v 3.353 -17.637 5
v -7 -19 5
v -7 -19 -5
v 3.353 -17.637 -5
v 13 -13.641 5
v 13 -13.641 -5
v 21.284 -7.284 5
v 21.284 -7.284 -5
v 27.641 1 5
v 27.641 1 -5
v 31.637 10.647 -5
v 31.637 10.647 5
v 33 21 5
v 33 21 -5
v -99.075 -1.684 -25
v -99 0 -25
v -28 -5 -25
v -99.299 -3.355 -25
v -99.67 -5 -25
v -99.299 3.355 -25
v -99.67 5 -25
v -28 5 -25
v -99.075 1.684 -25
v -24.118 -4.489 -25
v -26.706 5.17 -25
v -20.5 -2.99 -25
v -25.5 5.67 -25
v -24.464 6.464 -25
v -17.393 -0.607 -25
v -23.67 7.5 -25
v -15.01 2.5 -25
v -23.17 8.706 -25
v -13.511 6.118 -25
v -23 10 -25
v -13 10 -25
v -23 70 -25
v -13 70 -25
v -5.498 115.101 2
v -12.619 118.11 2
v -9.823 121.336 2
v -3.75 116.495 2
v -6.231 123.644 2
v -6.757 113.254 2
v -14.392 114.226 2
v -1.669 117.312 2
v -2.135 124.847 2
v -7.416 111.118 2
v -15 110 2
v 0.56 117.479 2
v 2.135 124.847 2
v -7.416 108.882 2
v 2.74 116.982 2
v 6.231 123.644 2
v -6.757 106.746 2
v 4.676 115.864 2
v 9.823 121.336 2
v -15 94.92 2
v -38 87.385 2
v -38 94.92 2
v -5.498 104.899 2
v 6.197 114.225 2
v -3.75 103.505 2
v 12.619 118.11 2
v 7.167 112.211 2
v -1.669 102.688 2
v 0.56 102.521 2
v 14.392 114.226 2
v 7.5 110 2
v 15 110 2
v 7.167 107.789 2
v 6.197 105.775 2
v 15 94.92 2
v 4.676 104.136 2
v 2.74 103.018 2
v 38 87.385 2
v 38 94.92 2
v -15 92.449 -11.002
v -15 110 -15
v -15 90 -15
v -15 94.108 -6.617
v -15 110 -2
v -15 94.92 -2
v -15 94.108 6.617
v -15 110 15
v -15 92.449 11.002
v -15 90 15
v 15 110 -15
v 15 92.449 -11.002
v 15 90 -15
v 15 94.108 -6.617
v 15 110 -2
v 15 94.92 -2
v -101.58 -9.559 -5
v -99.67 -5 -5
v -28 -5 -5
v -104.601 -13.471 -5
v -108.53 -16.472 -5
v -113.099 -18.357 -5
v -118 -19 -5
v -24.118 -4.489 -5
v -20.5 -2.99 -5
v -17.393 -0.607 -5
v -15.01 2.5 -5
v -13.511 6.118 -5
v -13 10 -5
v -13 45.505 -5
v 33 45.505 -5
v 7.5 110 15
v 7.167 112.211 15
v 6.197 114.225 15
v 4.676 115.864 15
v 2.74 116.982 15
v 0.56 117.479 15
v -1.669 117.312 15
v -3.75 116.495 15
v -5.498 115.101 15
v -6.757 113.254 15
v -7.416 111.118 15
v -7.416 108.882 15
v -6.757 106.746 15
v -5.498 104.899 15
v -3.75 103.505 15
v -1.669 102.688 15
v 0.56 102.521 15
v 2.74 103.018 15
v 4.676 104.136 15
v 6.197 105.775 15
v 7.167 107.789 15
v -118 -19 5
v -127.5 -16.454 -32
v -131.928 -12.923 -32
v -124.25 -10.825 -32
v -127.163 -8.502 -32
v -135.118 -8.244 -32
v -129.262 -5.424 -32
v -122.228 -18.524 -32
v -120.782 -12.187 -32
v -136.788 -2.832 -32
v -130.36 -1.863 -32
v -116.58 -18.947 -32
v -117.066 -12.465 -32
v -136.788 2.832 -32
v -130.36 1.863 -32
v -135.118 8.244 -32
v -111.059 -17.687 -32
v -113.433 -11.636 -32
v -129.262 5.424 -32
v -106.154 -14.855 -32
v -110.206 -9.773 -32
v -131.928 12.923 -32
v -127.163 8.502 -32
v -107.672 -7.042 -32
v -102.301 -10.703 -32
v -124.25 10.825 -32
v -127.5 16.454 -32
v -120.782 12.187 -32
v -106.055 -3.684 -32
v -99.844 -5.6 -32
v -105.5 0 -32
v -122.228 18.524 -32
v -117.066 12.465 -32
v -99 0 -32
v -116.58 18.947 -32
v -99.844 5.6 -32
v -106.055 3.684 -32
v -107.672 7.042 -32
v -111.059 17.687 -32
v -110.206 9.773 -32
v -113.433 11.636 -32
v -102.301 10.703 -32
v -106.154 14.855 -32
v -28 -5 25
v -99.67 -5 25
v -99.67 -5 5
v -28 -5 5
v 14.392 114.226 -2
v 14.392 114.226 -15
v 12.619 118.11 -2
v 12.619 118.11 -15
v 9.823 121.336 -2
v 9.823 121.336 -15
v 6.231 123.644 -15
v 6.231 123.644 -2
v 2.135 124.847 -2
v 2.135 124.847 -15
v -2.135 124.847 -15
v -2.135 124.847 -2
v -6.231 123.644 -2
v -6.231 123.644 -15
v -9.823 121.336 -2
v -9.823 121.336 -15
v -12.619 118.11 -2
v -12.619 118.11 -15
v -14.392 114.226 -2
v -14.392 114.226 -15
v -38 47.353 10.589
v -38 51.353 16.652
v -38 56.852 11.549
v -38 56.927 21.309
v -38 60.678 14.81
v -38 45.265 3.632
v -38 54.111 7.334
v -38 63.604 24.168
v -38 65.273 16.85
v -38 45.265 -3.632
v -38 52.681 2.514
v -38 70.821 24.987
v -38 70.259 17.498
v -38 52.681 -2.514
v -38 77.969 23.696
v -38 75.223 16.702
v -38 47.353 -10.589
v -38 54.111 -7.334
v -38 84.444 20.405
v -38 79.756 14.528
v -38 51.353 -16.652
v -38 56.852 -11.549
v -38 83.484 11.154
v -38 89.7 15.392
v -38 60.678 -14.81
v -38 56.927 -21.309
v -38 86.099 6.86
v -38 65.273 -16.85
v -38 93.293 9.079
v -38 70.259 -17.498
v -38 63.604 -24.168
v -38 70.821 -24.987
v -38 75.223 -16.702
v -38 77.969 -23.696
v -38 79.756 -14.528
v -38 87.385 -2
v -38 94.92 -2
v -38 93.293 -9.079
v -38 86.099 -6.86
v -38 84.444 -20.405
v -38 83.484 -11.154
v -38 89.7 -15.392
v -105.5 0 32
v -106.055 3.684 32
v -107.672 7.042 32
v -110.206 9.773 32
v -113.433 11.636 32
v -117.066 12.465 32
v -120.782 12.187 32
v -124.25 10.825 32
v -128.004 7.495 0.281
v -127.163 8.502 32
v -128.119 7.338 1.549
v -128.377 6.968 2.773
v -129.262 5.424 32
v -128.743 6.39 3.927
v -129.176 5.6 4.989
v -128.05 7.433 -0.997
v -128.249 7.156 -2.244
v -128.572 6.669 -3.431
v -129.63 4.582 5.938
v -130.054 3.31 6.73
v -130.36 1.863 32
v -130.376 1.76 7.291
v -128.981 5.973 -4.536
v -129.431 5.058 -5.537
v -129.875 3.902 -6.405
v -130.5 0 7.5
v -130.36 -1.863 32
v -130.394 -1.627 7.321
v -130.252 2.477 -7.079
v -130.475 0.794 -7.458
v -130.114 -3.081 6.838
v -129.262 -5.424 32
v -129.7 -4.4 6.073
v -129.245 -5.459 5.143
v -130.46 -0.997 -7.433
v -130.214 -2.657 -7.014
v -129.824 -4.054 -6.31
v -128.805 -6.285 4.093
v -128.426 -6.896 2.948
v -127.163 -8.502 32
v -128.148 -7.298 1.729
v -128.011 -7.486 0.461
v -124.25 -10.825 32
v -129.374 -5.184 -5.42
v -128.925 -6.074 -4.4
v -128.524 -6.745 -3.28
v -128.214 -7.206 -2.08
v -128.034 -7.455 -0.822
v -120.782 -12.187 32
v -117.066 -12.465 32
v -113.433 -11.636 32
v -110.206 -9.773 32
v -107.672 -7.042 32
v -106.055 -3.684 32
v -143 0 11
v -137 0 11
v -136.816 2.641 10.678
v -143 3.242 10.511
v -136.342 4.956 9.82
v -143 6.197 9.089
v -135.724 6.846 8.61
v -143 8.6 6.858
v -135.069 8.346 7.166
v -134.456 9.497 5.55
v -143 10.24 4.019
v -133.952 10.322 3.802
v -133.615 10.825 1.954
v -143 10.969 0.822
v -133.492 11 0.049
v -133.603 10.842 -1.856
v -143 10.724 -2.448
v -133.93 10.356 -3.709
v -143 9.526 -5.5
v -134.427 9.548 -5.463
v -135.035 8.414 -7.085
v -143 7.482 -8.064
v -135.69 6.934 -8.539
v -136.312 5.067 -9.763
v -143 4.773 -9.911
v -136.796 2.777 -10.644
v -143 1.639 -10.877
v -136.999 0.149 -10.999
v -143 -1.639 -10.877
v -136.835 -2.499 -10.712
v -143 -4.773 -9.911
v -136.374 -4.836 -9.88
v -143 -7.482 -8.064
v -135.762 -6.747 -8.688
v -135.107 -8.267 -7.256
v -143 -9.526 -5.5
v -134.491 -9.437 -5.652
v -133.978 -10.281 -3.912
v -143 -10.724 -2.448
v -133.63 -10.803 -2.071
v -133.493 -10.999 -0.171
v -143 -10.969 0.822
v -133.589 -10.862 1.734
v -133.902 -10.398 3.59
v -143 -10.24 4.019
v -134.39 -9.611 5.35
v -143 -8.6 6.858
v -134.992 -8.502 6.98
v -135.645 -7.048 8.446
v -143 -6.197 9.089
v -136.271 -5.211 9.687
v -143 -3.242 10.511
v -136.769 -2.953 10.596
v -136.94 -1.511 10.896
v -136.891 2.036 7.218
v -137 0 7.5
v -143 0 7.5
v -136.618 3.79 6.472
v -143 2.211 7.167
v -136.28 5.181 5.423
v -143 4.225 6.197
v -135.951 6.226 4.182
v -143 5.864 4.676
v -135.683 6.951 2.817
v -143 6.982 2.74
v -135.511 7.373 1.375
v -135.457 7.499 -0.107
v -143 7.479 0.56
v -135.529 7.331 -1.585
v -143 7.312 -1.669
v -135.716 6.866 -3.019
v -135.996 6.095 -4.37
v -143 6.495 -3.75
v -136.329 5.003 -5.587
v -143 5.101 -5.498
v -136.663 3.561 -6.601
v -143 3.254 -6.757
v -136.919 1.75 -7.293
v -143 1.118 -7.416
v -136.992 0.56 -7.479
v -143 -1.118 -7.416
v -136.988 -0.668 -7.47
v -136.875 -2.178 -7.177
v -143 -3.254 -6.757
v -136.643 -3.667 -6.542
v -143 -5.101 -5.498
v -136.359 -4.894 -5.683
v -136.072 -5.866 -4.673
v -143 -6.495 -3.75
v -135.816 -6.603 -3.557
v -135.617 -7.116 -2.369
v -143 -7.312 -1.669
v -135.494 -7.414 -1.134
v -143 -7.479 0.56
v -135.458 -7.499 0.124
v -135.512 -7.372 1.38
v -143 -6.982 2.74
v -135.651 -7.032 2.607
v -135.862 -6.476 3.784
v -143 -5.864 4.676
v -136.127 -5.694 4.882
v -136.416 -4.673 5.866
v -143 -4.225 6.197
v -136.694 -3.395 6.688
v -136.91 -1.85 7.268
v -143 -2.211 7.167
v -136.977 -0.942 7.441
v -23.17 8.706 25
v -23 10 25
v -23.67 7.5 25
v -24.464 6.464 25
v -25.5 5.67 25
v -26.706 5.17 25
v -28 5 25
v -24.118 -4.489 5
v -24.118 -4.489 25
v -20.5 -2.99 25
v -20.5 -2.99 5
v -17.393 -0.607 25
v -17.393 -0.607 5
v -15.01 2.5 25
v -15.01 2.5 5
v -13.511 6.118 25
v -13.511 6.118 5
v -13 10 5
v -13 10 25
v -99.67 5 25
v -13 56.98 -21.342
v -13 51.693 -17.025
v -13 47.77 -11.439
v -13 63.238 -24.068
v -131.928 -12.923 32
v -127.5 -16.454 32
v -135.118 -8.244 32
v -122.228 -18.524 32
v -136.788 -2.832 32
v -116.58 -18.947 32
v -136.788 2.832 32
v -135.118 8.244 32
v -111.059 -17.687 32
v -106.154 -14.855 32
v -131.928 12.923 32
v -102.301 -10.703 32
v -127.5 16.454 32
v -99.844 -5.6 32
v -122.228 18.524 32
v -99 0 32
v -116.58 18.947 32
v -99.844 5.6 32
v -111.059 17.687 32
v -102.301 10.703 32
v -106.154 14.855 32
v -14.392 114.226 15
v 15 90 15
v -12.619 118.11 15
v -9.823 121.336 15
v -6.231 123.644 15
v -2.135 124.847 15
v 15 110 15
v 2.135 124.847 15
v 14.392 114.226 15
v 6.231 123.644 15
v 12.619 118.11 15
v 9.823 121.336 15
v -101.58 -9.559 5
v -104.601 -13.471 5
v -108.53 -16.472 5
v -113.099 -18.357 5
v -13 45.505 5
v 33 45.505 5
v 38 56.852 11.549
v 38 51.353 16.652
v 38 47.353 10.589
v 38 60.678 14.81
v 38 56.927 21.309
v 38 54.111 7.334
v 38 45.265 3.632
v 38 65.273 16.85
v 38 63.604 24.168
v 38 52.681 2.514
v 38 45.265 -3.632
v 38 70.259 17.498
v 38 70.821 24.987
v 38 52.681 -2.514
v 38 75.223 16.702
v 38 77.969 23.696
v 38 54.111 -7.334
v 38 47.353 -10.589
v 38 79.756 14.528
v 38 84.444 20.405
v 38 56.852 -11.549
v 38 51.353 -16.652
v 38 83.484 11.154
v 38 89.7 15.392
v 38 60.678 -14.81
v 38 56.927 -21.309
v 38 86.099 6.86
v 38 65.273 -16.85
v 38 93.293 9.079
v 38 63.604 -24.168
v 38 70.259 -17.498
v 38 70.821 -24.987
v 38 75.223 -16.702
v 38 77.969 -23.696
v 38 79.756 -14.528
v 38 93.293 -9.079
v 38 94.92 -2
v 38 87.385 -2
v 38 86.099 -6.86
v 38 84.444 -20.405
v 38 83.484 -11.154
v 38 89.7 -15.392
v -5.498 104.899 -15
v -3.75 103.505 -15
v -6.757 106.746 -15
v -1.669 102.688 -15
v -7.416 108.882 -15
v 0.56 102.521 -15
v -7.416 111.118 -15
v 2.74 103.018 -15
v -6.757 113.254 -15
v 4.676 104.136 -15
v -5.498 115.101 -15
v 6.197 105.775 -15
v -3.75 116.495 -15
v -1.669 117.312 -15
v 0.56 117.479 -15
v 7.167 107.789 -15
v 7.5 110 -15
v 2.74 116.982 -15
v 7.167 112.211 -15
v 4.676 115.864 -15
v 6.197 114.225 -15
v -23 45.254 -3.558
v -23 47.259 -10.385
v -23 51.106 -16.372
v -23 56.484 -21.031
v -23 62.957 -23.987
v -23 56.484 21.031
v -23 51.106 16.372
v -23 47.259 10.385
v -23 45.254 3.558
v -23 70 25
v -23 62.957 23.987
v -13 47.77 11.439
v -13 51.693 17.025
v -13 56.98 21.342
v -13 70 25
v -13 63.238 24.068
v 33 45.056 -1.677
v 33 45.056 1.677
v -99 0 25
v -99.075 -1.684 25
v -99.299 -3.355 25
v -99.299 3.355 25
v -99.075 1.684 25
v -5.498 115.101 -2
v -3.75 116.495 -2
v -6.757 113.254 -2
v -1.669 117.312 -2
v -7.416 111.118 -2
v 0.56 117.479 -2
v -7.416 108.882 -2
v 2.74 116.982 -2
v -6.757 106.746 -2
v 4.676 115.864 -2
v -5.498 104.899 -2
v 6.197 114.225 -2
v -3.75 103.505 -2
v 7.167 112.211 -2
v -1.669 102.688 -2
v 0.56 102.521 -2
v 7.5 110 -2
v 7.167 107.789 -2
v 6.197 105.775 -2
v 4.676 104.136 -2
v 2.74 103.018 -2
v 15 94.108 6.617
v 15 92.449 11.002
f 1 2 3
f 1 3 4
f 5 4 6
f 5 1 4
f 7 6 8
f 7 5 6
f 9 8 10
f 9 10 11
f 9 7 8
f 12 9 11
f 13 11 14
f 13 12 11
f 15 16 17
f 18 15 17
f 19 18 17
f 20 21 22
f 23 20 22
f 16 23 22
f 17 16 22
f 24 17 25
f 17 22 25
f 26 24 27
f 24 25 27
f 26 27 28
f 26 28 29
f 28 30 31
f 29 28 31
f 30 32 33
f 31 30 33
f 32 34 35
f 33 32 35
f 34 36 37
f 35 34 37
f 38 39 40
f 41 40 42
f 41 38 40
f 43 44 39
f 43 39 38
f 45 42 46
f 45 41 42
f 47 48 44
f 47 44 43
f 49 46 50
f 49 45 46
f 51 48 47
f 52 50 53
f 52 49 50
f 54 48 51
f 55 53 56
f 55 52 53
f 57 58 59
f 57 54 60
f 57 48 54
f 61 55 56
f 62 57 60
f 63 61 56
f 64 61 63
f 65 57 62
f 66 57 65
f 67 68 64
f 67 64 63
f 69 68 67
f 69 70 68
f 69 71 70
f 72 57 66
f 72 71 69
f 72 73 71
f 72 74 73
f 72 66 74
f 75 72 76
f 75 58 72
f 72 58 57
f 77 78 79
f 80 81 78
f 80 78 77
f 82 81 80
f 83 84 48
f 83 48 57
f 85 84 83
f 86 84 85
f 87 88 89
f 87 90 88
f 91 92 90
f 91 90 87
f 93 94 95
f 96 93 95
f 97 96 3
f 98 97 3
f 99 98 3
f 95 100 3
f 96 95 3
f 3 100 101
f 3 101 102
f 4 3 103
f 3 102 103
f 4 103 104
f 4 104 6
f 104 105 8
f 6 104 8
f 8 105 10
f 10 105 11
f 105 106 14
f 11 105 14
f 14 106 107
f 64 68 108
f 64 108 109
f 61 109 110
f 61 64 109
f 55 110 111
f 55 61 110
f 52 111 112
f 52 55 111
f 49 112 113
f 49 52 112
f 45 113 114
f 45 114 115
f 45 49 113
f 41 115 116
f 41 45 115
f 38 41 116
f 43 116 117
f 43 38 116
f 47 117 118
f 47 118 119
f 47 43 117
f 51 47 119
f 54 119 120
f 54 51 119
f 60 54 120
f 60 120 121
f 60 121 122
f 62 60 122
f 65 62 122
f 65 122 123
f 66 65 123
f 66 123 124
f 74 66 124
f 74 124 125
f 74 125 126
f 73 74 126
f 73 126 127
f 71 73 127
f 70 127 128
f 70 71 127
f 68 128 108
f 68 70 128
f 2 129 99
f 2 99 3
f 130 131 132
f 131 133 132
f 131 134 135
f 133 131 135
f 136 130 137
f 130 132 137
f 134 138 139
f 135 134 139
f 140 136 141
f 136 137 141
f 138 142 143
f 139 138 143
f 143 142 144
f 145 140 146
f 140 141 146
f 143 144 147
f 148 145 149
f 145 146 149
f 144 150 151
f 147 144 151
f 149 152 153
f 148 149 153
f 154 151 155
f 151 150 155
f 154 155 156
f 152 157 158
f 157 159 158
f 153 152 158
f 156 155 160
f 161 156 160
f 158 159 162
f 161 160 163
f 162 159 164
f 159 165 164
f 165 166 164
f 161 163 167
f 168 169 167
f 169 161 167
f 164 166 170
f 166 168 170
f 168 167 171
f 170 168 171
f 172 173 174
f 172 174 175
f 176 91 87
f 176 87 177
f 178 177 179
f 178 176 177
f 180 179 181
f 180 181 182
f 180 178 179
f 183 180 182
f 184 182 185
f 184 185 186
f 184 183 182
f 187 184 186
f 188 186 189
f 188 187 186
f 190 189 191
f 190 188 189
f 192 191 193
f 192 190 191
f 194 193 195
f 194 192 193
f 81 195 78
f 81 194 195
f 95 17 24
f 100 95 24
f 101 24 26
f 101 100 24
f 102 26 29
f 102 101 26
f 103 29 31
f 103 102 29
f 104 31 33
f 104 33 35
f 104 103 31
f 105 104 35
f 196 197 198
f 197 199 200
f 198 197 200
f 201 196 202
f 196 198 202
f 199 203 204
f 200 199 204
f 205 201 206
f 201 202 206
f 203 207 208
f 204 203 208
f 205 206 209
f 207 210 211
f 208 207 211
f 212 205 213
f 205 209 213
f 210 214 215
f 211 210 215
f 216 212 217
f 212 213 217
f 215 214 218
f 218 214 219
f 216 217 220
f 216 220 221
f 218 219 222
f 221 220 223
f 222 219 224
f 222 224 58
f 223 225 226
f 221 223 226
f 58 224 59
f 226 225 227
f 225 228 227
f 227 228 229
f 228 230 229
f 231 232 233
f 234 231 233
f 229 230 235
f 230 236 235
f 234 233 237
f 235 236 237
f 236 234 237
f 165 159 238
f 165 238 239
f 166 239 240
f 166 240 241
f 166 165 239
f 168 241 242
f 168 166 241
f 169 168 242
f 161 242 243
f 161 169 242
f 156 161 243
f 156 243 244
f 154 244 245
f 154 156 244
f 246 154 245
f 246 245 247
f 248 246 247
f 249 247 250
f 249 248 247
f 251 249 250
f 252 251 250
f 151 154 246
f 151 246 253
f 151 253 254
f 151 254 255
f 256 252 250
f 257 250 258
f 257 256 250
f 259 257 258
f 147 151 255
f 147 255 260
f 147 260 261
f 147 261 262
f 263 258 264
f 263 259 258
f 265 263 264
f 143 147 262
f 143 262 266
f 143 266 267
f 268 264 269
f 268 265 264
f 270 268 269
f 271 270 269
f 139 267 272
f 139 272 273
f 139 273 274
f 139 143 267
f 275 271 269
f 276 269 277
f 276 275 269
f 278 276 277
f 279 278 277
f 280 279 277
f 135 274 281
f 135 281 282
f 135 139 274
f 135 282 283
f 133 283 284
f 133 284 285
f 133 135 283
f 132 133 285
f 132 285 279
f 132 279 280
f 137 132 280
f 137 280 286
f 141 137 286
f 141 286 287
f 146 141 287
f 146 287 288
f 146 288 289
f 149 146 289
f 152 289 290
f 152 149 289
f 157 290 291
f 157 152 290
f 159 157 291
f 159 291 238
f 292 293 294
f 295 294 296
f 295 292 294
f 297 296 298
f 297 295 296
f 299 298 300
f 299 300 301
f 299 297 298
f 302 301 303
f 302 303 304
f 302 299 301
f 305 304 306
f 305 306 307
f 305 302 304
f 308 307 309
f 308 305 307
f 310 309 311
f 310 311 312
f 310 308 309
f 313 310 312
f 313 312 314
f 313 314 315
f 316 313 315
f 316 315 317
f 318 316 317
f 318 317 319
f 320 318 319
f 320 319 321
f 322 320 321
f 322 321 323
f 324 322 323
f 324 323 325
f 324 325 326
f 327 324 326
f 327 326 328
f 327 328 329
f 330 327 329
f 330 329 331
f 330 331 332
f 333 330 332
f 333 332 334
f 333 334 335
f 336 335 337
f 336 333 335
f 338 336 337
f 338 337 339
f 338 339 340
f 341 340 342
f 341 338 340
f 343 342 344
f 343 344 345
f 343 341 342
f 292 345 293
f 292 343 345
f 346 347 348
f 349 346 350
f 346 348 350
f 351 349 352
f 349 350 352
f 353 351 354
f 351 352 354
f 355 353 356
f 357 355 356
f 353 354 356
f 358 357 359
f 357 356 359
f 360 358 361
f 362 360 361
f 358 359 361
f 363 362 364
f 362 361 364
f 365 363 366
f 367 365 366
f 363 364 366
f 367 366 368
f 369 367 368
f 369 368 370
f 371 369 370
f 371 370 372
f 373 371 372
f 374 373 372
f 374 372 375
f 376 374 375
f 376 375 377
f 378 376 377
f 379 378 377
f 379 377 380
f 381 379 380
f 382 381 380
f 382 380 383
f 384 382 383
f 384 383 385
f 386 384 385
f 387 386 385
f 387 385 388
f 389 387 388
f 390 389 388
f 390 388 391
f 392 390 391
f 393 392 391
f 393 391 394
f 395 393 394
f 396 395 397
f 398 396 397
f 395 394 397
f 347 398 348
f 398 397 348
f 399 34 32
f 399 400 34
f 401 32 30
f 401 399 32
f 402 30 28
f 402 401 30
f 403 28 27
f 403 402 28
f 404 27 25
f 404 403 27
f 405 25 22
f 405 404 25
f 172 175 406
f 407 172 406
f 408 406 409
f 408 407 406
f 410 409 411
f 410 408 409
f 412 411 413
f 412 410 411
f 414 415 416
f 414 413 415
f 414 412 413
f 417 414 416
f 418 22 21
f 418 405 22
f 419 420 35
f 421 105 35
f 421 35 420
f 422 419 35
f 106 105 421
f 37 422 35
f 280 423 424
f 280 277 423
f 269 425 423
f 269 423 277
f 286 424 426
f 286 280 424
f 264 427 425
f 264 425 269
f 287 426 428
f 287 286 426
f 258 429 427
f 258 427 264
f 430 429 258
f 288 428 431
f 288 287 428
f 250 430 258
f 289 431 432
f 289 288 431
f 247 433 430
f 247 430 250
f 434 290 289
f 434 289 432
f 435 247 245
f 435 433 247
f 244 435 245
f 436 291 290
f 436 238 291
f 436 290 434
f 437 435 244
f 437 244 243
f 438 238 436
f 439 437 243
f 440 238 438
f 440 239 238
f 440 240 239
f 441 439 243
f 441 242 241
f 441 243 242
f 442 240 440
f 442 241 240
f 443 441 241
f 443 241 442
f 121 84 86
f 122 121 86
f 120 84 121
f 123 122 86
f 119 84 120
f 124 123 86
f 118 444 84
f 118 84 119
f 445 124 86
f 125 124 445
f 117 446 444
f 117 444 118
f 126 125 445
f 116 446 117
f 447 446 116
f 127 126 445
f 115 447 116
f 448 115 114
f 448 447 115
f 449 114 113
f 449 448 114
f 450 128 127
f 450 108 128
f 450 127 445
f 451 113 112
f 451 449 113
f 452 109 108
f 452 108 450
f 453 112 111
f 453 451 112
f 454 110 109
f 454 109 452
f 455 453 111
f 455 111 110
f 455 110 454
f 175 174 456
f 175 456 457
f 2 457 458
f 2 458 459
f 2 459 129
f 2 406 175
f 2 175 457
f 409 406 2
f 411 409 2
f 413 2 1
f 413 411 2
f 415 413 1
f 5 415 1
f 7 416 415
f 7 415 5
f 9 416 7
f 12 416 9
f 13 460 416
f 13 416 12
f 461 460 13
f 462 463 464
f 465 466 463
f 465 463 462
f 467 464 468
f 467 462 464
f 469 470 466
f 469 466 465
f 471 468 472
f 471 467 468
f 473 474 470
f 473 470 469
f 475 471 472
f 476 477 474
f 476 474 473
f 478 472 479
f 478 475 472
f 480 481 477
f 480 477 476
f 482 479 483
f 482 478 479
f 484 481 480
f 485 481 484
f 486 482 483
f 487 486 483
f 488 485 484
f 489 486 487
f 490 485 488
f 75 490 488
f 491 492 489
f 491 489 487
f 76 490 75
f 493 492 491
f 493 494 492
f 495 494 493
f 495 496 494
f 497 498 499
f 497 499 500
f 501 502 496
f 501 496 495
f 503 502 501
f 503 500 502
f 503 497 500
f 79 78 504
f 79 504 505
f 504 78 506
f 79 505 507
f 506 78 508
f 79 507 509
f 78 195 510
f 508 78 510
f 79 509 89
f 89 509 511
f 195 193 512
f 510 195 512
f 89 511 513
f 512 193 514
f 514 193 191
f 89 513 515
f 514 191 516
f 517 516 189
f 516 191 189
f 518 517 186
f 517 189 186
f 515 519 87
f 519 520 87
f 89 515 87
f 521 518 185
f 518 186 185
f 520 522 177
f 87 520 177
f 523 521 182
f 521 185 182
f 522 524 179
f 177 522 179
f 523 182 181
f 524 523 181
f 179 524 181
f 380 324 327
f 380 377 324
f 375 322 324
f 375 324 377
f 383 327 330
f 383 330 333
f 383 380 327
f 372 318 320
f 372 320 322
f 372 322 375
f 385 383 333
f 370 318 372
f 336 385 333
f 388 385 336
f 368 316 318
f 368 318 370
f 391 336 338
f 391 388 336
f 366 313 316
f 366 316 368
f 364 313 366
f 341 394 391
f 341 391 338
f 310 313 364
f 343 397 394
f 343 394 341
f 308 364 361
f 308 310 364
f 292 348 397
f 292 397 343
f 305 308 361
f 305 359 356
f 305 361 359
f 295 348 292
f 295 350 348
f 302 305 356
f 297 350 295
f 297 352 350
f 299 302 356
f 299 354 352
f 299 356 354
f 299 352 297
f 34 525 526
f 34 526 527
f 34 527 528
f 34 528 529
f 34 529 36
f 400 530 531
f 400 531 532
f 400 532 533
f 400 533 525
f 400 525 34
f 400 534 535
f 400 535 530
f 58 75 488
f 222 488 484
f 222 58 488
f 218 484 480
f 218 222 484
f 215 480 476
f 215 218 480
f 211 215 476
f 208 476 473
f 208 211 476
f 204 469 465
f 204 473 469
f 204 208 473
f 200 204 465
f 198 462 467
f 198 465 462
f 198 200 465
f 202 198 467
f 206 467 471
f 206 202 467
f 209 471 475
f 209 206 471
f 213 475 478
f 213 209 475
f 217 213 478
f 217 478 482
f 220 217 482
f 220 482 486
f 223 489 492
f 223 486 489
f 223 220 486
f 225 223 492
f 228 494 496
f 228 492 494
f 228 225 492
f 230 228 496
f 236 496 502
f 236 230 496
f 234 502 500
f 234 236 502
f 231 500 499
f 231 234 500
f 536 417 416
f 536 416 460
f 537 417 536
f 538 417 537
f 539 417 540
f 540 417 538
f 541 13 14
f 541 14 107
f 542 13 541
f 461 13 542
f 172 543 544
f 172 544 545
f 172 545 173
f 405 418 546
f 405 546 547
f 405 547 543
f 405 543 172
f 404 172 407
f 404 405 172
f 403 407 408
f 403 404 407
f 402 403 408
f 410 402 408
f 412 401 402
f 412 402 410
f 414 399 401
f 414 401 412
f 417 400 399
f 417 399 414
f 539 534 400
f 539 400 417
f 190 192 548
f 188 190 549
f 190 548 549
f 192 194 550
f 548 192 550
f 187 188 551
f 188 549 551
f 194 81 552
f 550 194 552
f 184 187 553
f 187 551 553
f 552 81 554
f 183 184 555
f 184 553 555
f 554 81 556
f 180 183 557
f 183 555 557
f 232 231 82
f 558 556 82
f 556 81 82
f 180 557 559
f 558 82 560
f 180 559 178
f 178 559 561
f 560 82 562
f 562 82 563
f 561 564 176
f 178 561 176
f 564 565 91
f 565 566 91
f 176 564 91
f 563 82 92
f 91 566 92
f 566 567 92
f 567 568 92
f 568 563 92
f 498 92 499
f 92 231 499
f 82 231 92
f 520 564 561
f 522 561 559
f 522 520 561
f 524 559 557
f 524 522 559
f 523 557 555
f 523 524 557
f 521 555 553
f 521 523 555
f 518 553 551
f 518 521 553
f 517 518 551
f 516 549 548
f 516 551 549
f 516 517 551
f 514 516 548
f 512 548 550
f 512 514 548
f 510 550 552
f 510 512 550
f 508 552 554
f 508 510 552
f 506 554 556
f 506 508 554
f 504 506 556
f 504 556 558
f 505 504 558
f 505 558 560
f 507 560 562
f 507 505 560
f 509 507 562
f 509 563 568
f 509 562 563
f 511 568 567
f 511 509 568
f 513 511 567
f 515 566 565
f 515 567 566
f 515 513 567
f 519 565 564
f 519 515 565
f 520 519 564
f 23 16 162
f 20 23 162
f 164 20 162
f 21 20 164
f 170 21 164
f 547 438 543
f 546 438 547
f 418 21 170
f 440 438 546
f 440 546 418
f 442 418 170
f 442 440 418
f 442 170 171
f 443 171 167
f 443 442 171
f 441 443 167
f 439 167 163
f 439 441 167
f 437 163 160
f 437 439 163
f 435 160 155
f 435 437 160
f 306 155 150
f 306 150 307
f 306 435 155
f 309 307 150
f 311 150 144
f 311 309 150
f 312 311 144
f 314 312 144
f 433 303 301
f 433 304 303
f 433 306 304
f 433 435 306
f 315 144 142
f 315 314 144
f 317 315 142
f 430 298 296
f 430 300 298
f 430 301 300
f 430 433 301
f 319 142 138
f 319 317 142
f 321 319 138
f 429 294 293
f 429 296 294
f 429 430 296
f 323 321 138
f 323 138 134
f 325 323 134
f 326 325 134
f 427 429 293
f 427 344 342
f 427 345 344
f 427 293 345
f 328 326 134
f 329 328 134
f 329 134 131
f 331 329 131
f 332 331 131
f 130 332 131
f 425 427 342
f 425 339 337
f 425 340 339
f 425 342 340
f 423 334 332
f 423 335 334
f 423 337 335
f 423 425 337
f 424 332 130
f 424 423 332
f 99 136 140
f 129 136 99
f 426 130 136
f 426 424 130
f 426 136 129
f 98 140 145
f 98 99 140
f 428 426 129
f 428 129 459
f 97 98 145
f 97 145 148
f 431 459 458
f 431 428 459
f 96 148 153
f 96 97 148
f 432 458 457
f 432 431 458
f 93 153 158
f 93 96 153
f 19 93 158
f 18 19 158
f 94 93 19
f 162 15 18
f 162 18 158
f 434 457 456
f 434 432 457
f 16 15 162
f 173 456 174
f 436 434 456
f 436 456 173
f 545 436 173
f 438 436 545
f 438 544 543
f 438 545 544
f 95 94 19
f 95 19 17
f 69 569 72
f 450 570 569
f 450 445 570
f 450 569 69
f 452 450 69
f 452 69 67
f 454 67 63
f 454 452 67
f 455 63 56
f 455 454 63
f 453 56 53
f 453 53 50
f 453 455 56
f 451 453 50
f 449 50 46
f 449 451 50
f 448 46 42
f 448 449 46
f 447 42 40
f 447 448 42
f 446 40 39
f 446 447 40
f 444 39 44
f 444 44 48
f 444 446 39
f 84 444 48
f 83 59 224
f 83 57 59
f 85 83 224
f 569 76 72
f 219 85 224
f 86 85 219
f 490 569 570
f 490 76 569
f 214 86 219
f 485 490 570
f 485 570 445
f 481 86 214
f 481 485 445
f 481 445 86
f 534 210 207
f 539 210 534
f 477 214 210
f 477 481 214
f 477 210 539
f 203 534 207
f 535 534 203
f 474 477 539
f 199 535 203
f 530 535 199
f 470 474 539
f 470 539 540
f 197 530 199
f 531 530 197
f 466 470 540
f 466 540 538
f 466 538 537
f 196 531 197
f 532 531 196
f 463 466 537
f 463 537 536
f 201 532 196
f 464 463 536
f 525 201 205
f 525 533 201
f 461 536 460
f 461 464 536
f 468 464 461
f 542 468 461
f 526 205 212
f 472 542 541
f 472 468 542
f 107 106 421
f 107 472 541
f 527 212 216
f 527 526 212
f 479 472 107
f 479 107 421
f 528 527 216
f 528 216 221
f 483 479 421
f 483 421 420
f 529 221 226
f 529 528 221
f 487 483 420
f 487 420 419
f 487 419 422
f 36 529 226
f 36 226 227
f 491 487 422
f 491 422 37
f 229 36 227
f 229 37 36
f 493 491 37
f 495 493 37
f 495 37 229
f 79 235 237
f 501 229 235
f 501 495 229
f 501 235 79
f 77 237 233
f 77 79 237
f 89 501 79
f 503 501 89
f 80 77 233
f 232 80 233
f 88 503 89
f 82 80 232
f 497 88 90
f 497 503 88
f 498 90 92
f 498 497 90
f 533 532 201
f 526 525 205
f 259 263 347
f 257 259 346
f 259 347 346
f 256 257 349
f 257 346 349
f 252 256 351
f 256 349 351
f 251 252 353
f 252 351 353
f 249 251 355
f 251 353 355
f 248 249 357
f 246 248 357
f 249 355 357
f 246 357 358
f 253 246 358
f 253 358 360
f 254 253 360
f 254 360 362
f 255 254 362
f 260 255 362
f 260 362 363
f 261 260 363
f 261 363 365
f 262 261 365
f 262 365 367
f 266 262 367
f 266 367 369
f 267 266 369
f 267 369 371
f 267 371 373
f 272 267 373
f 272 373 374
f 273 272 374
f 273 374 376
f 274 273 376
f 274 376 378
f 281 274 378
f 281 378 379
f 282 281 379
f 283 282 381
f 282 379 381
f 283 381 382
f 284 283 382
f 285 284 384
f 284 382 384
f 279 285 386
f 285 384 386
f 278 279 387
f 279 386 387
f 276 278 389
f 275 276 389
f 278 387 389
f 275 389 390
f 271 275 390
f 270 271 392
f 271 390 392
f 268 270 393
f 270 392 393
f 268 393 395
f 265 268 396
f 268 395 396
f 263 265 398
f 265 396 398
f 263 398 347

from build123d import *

# Parameters (mm, degrees)
SKETCH_2_R                      = 25
SKETCH_2_R_2                    = 17.5
EXTRUDE_1_DEPTH                 = 38
SKETCH_3_R                      = 7.5
EXTRUDE_2_DEPTH                 = 15
CUT_EXTRUDE_START               = 70
SKETCH_4_W                      = 76
SKETCH_4_H                      = 4
CUT_EXTRUDE_1_DEPTH             = 64.018795664
EXTRUDE_3_DEPTH                 = 25
EXTRUDE_4_DEPTH                 = 5
SKETCH_5_6_R                    = 19
SKETCH_5_6_R_2                  = 12.5
EXTRUDE_5_DEPTH                 = 32
EXTRUDE_6_REACH                 = 224.284
EXTRUDE_6_END_RADIUS            = 19
SKETCH_7_R                      = 11
SKETCH_7_R_2                    = 7.5
CUT_EXTRUDE_2_REACH             = 224.284
SKETCH_7_2_R                    = 7.5
CUT_EXTRUDE_3_REACH             = 194.608
SKETCH_8_R                      = 17.5
CUT_EXTRUDE_3_DIRECTION_2_DEPTH = 193.608411122


with BuildPart() as part:
    # 草图2 → 凸台-拉伸1 (new, symmetric)
    with BuildSketch(Plane(origin=(0, 0, 0), x_dir=(0, 0, -1), z_dir=(1, 0, 0))):
        with Locations((0, 70)):
            Circle(SKETCH_2_R)
        with Locations((0, 70)):
            Circle(SKETCH_2_R_2, mode=Mode.SUBTRACT)
    extrude(amount=EXTRUDE_1_DEPTH, both=True)

    # 草图3 → 凸台-拉伸2 (add, symmetric)
    with BuildSketch(Plane.XY):
        with BuildLine():
            Line((-15, 110), (-15, 87.5))
            Line((-15, 87.5), (15, 87.5))
            Line((15, 87.5), (15, 110))
            ThreePointArc((15, 110), (0, 125), (-15, 110))
        make_face()
        with Locations((0, 110)):
            Circle(SKETCH_3_R, mode=Mode.SUBTRACT)
    extrude(amount=EXTRUDE_2_DEPTH, both=True)

    # 草图4 → 切除-拉伸1 (cut, through all)
    with BuildSketch(Plane(origin=(0, 0, 0), x_dir=(1, 0, 0), z_dir=(0, 1, 0)).offset(CUT_EXTRUDE_START)):
        Rectangle(SKETCH_4_W, SKETCH_4_H)
    extrude(amount=CUT_EXTRUDE_1_DEPTH, mode=Mode.SUBTRACT)

    # 草图5 → 凸台-拉伸3 (add, symmetric)
    with BuildSketch(Plane.XY):
        with BuildLine():
            Line((-28, 5), (-99.66969722, 5))
            ThreePointArc((-99.66969722, 5), (-99.168168533, 2.522325037), (-99, 0))
            ThreePointArc((-99, 0), (-99.168168533, -2.522325037), (-99.66969722, -5))
            Line((-99.66969722, -5), (-28, -5))
            ThreePointArc((-28, -5), (-17.393398282, -0.606601718), (-13, 10))
            Line((-13, 10), (-13, 70))
            Line((-13, 70), (-23, 70))
            Line((-23, 70), (-23, 10))
            ThreePointArc((-23, 10), (-24.464466094, 6.464466094), (-28, 5))
        make_face()
    extrude(amount=EXTRUDE_3_DEPTH, both=True)

    # 草图5<5> → 凸台-拉伸4 (add, symmetric)
    with BuildSketch(Plane.XY):
        with BuildLine():
            ThreePointArc((-99.66969722, -5), (-106.467437405, -15.099668871), (-118, -19))
            Line((-118, -19), (-7, -19))
            ThreePointArc((-7, -19), (21.284271247, -7.284271247), (33, 21))
            Line((33, 21), (33, 70))
            Line((33, 70), (-13, 70))
            Line((-13, 70), (-13, 10))
            ThreePointArc((-13, 10), (-17.393398282, -0.606601718), (-28, -5))
            Line((-28, -5), (-99.66969722, -5))
        make_face()
    extrude(amount=EXTRUDE_4_DEPTH, both=True)

    # 草图5<6> → 凸台-拉伸5 (add, symmetric)
    with BuildSketch(Plane.XY):
        with Locations((-118, 0)):
            Circle(SKETCH_5_6_R)
        with Locations((-118, 0)):
            Circle(SKETCH_5_6_R_2, mode=Mode.SUBTRACT)
    extrude(amount=EXTRUDE_5_DEPTH, both=True)

    # 凸台-拉伸6: up to this cylinder (the profile starts outside it)
    extrude_6_end = Plane(origin=(-118, 0, -10.688873), z_dir=(0, 0, -1)) * Cylinder(EXTRUDE_6_END_RADIUS, 487.568, mode=Mode.PRIVATE)
    # 草图7 → 凸台-拉伸6 (add, up to the surface)
    with BuildSketch(Plane.ZY.offset(143), mode=Mode.PRIVATE) as extrude_6_sk1:
        Circle(SKETCH_7_R)
        Circle(SKETCH_7_R_2, mode=Mode.SUBTRACT)
    extrude_6_tool1 = extrude(extrude_6_sk1.sketch, amount=-EXTRUDE_6_REACH, mode=Mode.PRIVATE) - extrude_6_end
    add(extrude_6_tool1.solids().sort_by_distance((-143, 0, -10.688873))[0])

    # 草图7<2> → 切除-拉伸2 (cut, up to next)
    with BuildSketch(Plane.ZY.offset(143), mode=Mode.PRIVATE) as cut_extrude_2_sk1:
        Circle(SKETCH_7_2_R)
    cut_extrude_2_tool1 = extrude(cut_extrude_2_sk1.sketch, amount=-CUT_EXTRUDE_2_REACH, mode=Mode.PRIVATE) & part.part
    add(cut_extrude_2_tool1.solids().sort_by_distance((-143, 0, 0))[0], mode=Mode.SUBTRACT)

    # 草图8 → 切除-拉伸3 (cut, up to next)
    with BuildSketch(Plane(origin=(0, 0, 0), x_dir=(0, 0, -1), z_dir=(1, 0, 0)), mode=Mode.PRIVATE) as cut_extrude_3_sk1:
        with Locations((0, 70)):
            Circle(SKETCH_8_R)
    cut_extrude_3_tool1 = extrude(cut_extrude_3_sk1.sketch, amount=-CUT_EXTRUDE_3_REACH, mode=Mode.PRIVATE) & part.part
    add(cut_extrude_3_tool1.solids().sort_by_distance((0, 70, 0))[0], mode=Mode.SUBTRACT)

    # 草图8 → 切除-拉伸3 direction 2 (cut)
    with BuildSketch(Plane(origin=(0, 0, 0), x_dir=(0, 0, -1), z_dir=(1, 0, 0))):
        with Locations((0, 70)):
            Circle(SKETCH_8_R)
    extrude(amount=CUT_EXTRUDE_3_DIRECTION_2_DEPTH, mode=Mode.SUBTRACT)


solid = part.part
